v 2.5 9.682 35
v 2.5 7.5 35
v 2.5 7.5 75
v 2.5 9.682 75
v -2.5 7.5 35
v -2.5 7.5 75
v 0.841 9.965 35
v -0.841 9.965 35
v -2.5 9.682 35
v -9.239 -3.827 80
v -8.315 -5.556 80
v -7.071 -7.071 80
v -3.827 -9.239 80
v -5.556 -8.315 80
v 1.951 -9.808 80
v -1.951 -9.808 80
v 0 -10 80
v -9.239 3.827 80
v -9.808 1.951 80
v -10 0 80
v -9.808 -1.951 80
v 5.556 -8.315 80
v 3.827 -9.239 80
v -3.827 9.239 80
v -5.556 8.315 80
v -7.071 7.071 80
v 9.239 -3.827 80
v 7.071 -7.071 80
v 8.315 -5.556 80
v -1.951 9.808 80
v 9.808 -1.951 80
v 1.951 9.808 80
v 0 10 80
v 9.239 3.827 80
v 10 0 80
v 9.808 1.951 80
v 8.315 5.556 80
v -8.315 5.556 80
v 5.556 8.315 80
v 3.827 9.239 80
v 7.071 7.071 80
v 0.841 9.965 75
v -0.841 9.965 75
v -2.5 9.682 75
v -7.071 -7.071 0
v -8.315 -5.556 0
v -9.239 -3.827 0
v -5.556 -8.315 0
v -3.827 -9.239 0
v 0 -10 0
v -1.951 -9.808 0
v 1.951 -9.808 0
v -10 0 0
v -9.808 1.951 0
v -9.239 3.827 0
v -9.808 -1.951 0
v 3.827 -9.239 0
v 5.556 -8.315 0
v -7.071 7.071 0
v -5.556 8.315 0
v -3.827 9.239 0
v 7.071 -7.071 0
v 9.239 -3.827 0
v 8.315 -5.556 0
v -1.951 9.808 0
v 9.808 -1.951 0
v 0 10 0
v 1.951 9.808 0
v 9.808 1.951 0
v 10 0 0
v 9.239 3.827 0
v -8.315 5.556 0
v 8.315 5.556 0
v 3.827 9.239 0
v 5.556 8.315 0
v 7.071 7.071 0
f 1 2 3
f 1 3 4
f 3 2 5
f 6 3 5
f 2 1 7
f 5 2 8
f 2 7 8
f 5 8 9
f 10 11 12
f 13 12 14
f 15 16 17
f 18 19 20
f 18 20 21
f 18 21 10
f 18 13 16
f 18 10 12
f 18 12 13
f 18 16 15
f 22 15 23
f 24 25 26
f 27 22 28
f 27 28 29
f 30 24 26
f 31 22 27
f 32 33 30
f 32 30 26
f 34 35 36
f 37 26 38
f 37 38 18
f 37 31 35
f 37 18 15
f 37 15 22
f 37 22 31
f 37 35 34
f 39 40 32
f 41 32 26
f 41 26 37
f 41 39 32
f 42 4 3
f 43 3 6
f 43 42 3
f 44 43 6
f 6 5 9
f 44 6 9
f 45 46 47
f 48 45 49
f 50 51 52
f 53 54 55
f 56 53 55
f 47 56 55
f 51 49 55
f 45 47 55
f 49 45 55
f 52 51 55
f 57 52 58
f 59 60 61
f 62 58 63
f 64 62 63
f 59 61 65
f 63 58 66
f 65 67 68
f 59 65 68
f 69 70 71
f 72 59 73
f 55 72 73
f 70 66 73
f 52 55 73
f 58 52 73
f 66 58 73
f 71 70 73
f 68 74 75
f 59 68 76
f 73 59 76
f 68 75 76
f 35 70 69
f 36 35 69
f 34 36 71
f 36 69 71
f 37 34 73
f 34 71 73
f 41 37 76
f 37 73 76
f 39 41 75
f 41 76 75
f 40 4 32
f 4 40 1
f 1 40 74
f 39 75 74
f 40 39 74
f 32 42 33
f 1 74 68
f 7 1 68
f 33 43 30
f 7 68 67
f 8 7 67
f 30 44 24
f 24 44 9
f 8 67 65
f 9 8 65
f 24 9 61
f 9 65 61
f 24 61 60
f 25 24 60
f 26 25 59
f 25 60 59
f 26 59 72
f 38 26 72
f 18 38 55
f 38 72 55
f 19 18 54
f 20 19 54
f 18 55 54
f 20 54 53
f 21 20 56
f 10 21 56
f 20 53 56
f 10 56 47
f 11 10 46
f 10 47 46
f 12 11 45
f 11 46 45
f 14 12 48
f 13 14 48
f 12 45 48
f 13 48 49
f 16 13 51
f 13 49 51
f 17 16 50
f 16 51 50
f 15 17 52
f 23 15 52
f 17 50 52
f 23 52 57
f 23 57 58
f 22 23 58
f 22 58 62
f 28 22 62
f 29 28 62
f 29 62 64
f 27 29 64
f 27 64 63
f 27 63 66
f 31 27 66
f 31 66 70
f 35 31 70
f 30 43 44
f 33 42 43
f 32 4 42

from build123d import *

# Parameters (mm, degrees)
SKETCH1_R           = 10
BOSS_EXTRUDE1_DEPTH = 80
SKETCH3_W           = 5
SKETCH3_H           = 5
CUT_EXTRUDE1_DEPTH  = 40


with BuildPart() as part:
    # Sketch1 → Boss-Extrude1 (new body)
    with BuildSketch(Plane.XY):
        Circle(SKETCH1_R)
    extrude(amount=BOSS_EXTRUDE1_DEPTH)

    # Sketch3 → Cut-Extrude1 (cut)
    with BuildSketch(Plane(origin=(0, 0, 75), x_dir=(-1, 0, 0), z_dir=(0, 0, -1))):
        with Locations((0, 10)):
            Rectangle(SKETCH3_W, SKETCH3_H)
    extrude(amount=CUT_EXTRUDE1_DEPTH, mode=Mode.SUBTRACT)


solid = part.part
